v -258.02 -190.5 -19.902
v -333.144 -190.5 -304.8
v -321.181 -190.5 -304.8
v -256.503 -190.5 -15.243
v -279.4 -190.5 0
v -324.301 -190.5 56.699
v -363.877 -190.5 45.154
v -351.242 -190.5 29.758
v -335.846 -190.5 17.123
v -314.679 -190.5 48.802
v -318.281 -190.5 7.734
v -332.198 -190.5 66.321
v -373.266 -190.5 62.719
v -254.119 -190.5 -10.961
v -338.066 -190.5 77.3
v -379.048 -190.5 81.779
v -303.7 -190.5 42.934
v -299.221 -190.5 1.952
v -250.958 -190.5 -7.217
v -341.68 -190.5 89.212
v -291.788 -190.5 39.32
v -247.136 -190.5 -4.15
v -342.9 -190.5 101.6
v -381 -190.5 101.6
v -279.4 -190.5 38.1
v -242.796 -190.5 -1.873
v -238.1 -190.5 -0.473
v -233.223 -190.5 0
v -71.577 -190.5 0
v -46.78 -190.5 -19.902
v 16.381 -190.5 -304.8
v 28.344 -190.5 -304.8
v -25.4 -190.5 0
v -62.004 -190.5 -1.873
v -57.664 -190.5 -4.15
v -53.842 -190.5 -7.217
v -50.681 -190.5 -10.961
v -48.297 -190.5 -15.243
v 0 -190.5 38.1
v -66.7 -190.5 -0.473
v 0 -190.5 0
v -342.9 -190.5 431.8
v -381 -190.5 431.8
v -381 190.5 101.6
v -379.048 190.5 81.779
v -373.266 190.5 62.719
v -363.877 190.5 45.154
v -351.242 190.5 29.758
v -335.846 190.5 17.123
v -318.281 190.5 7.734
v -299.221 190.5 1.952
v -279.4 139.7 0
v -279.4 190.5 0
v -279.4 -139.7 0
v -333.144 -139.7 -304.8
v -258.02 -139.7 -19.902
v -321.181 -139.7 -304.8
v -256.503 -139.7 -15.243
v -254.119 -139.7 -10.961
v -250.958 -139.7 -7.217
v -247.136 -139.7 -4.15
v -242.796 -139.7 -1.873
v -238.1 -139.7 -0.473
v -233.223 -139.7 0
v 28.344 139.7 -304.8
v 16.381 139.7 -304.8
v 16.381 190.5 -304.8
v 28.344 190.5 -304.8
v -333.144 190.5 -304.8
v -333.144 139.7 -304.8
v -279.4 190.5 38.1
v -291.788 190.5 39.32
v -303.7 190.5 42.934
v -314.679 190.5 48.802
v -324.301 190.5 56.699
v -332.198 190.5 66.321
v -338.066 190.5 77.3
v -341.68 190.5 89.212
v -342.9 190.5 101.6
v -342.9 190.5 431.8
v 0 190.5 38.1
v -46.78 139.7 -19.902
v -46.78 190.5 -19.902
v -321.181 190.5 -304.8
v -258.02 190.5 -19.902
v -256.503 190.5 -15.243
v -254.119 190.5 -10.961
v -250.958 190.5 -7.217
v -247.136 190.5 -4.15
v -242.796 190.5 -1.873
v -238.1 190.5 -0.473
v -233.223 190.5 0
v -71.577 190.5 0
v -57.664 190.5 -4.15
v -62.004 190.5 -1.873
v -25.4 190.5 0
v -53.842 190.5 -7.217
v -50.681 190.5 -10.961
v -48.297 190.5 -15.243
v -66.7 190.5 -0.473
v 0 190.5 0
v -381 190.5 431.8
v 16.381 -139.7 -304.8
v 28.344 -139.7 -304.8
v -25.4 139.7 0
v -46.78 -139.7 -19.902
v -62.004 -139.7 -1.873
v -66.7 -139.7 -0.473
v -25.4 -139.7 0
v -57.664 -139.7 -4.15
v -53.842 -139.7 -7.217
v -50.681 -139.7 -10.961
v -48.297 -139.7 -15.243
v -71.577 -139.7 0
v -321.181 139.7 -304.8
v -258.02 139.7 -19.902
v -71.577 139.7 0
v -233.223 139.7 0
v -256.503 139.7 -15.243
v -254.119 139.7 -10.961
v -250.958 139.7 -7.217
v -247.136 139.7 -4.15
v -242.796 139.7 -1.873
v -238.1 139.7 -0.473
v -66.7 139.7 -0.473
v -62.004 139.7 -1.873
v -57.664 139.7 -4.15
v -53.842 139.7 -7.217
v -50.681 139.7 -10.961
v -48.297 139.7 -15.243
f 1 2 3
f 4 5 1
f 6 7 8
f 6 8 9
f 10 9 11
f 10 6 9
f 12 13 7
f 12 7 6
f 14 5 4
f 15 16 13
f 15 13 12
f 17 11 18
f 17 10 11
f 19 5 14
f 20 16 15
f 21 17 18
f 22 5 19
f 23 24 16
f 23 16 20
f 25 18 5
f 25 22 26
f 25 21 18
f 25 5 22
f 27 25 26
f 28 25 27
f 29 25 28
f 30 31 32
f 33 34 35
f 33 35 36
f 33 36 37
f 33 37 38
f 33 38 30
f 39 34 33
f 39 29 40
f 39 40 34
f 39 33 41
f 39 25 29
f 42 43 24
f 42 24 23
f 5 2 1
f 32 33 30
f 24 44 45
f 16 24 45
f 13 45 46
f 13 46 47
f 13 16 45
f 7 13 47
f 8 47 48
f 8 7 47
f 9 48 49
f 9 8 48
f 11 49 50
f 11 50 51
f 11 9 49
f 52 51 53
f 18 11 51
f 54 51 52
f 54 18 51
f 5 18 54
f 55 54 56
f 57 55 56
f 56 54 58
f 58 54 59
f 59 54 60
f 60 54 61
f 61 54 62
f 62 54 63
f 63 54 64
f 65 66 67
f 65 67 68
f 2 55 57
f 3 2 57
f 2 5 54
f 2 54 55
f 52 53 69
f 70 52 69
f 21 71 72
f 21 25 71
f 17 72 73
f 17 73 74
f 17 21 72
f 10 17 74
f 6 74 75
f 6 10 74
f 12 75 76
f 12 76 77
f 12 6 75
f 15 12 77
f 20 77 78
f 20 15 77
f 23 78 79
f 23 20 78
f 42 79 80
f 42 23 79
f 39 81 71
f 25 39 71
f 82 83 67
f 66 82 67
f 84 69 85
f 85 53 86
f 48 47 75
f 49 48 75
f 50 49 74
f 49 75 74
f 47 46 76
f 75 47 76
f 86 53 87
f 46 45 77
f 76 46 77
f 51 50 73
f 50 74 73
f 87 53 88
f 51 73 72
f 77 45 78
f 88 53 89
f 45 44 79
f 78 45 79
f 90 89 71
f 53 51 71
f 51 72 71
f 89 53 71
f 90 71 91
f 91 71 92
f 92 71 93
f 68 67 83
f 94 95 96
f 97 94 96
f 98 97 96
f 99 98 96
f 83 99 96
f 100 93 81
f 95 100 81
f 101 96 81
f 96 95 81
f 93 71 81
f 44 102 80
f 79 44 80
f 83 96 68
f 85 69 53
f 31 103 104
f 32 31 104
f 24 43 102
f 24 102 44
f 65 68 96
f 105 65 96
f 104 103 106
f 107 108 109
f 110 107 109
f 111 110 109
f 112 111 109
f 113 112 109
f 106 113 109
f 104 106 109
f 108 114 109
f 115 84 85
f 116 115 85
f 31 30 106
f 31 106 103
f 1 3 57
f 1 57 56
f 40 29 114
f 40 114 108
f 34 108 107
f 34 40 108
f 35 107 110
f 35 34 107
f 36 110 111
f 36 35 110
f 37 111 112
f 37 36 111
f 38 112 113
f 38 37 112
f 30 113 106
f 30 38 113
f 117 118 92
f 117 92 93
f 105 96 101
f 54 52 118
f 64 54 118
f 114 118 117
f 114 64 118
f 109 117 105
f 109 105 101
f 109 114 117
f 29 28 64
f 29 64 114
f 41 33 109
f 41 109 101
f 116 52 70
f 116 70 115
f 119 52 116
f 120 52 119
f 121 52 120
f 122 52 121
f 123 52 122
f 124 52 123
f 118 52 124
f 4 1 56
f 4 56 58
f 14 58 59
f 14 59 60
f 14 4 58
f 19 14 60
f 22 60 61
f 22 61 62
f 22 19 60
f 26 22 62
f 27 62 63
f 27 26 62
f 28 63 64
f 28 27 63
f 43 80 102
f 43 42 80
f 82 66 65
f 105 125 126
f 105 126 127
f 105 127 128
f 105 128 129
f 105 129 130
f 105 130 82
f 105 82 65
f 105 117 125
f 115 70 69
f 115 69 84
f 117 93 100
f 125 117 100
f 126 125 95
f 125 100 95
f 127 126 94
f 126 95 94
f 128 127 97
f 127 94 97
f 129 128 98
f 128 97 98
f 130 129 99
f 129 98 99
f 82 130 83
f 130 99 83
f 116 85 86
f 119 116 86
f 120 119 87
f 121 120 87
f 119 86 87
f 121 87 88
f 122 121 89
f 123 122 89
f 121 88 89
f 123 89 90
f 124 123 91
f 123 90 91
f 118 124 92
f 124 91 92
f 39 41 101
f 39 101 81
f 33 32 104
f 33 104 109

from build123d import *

# Parameters (mm, degrees)
F1_DEPTH = 190.5
F3_DEPTH = 50.8


with BuildPart() as f1:
    # F0 (on Front) → F1 (new body, symmetric)
    with BuildSketch(Plane.XZ):
        with BuildLine():
            Line((-342.9, 431.8), (-381, 431.8))
            Line((-381, 431.8), (-381, 101.6))
            ThreePointArc((-381, 101.6), (-351.2420489686, 29.7579510314), (-279.4, 0))
            Line((-279.4, 0), (0, 0))
            Line((0, 0), (0, 38.1))
            Line((0, 38.1), (-279.4, 38.1))
            ThreePointArc((-279.4, 38.1), (-324.3012806053, 56.6987193947), (-342.9, 101.6))
            Line((-342.9, 101.6), (-342.9, 431.8))
        make_face()
    extrude(amount=F1_DEPTH, both=True)

    # F2 (on face) → F3 (join)
    with BuildSketch(Plane.XZ.offset(190.5)):
        with BuildLine():
            Line((-279.4, 0), (-333.1444637199, -304.8))
            Line((-333.1444637199, -304.8), (-321.1806972317, -304.8))
            Line((-321.1806972317, -304.8), (-258.0204274065, -19.902433806))
            ThreePointArc((-258.0204274065, -19.902433806), (-249.1209650191, -5.5909341294), (-233.2225088256, 0))
            Line((-233.2225088256, 0), (-279.4, 0))
        make_face()
        with BuildLine():
            Line((-25.4, 0), (-71.5774911744, 0))
            ThreePointArc((-71.5774911744, 0), (-55.6790349809, -5.5909341294), (-46.7795725935, -19.902433806))
            Line((-46.7795725935, -19.902433806), (16.3806972317, -304.8))
            Line((16.3806972317, -304.8), (28.3444637199, -304.8))
            Line((28.3444637199, -304.8), (-25.4, 0))
        make_face()
    extrude(amount=-F3_DEPTH)

    # F4: F1 across plane


with BuildPart() as f1_1:
    add(f1.part)
    add(f1.part.mirror(Plane.XZ))


solid = f1_1.part
